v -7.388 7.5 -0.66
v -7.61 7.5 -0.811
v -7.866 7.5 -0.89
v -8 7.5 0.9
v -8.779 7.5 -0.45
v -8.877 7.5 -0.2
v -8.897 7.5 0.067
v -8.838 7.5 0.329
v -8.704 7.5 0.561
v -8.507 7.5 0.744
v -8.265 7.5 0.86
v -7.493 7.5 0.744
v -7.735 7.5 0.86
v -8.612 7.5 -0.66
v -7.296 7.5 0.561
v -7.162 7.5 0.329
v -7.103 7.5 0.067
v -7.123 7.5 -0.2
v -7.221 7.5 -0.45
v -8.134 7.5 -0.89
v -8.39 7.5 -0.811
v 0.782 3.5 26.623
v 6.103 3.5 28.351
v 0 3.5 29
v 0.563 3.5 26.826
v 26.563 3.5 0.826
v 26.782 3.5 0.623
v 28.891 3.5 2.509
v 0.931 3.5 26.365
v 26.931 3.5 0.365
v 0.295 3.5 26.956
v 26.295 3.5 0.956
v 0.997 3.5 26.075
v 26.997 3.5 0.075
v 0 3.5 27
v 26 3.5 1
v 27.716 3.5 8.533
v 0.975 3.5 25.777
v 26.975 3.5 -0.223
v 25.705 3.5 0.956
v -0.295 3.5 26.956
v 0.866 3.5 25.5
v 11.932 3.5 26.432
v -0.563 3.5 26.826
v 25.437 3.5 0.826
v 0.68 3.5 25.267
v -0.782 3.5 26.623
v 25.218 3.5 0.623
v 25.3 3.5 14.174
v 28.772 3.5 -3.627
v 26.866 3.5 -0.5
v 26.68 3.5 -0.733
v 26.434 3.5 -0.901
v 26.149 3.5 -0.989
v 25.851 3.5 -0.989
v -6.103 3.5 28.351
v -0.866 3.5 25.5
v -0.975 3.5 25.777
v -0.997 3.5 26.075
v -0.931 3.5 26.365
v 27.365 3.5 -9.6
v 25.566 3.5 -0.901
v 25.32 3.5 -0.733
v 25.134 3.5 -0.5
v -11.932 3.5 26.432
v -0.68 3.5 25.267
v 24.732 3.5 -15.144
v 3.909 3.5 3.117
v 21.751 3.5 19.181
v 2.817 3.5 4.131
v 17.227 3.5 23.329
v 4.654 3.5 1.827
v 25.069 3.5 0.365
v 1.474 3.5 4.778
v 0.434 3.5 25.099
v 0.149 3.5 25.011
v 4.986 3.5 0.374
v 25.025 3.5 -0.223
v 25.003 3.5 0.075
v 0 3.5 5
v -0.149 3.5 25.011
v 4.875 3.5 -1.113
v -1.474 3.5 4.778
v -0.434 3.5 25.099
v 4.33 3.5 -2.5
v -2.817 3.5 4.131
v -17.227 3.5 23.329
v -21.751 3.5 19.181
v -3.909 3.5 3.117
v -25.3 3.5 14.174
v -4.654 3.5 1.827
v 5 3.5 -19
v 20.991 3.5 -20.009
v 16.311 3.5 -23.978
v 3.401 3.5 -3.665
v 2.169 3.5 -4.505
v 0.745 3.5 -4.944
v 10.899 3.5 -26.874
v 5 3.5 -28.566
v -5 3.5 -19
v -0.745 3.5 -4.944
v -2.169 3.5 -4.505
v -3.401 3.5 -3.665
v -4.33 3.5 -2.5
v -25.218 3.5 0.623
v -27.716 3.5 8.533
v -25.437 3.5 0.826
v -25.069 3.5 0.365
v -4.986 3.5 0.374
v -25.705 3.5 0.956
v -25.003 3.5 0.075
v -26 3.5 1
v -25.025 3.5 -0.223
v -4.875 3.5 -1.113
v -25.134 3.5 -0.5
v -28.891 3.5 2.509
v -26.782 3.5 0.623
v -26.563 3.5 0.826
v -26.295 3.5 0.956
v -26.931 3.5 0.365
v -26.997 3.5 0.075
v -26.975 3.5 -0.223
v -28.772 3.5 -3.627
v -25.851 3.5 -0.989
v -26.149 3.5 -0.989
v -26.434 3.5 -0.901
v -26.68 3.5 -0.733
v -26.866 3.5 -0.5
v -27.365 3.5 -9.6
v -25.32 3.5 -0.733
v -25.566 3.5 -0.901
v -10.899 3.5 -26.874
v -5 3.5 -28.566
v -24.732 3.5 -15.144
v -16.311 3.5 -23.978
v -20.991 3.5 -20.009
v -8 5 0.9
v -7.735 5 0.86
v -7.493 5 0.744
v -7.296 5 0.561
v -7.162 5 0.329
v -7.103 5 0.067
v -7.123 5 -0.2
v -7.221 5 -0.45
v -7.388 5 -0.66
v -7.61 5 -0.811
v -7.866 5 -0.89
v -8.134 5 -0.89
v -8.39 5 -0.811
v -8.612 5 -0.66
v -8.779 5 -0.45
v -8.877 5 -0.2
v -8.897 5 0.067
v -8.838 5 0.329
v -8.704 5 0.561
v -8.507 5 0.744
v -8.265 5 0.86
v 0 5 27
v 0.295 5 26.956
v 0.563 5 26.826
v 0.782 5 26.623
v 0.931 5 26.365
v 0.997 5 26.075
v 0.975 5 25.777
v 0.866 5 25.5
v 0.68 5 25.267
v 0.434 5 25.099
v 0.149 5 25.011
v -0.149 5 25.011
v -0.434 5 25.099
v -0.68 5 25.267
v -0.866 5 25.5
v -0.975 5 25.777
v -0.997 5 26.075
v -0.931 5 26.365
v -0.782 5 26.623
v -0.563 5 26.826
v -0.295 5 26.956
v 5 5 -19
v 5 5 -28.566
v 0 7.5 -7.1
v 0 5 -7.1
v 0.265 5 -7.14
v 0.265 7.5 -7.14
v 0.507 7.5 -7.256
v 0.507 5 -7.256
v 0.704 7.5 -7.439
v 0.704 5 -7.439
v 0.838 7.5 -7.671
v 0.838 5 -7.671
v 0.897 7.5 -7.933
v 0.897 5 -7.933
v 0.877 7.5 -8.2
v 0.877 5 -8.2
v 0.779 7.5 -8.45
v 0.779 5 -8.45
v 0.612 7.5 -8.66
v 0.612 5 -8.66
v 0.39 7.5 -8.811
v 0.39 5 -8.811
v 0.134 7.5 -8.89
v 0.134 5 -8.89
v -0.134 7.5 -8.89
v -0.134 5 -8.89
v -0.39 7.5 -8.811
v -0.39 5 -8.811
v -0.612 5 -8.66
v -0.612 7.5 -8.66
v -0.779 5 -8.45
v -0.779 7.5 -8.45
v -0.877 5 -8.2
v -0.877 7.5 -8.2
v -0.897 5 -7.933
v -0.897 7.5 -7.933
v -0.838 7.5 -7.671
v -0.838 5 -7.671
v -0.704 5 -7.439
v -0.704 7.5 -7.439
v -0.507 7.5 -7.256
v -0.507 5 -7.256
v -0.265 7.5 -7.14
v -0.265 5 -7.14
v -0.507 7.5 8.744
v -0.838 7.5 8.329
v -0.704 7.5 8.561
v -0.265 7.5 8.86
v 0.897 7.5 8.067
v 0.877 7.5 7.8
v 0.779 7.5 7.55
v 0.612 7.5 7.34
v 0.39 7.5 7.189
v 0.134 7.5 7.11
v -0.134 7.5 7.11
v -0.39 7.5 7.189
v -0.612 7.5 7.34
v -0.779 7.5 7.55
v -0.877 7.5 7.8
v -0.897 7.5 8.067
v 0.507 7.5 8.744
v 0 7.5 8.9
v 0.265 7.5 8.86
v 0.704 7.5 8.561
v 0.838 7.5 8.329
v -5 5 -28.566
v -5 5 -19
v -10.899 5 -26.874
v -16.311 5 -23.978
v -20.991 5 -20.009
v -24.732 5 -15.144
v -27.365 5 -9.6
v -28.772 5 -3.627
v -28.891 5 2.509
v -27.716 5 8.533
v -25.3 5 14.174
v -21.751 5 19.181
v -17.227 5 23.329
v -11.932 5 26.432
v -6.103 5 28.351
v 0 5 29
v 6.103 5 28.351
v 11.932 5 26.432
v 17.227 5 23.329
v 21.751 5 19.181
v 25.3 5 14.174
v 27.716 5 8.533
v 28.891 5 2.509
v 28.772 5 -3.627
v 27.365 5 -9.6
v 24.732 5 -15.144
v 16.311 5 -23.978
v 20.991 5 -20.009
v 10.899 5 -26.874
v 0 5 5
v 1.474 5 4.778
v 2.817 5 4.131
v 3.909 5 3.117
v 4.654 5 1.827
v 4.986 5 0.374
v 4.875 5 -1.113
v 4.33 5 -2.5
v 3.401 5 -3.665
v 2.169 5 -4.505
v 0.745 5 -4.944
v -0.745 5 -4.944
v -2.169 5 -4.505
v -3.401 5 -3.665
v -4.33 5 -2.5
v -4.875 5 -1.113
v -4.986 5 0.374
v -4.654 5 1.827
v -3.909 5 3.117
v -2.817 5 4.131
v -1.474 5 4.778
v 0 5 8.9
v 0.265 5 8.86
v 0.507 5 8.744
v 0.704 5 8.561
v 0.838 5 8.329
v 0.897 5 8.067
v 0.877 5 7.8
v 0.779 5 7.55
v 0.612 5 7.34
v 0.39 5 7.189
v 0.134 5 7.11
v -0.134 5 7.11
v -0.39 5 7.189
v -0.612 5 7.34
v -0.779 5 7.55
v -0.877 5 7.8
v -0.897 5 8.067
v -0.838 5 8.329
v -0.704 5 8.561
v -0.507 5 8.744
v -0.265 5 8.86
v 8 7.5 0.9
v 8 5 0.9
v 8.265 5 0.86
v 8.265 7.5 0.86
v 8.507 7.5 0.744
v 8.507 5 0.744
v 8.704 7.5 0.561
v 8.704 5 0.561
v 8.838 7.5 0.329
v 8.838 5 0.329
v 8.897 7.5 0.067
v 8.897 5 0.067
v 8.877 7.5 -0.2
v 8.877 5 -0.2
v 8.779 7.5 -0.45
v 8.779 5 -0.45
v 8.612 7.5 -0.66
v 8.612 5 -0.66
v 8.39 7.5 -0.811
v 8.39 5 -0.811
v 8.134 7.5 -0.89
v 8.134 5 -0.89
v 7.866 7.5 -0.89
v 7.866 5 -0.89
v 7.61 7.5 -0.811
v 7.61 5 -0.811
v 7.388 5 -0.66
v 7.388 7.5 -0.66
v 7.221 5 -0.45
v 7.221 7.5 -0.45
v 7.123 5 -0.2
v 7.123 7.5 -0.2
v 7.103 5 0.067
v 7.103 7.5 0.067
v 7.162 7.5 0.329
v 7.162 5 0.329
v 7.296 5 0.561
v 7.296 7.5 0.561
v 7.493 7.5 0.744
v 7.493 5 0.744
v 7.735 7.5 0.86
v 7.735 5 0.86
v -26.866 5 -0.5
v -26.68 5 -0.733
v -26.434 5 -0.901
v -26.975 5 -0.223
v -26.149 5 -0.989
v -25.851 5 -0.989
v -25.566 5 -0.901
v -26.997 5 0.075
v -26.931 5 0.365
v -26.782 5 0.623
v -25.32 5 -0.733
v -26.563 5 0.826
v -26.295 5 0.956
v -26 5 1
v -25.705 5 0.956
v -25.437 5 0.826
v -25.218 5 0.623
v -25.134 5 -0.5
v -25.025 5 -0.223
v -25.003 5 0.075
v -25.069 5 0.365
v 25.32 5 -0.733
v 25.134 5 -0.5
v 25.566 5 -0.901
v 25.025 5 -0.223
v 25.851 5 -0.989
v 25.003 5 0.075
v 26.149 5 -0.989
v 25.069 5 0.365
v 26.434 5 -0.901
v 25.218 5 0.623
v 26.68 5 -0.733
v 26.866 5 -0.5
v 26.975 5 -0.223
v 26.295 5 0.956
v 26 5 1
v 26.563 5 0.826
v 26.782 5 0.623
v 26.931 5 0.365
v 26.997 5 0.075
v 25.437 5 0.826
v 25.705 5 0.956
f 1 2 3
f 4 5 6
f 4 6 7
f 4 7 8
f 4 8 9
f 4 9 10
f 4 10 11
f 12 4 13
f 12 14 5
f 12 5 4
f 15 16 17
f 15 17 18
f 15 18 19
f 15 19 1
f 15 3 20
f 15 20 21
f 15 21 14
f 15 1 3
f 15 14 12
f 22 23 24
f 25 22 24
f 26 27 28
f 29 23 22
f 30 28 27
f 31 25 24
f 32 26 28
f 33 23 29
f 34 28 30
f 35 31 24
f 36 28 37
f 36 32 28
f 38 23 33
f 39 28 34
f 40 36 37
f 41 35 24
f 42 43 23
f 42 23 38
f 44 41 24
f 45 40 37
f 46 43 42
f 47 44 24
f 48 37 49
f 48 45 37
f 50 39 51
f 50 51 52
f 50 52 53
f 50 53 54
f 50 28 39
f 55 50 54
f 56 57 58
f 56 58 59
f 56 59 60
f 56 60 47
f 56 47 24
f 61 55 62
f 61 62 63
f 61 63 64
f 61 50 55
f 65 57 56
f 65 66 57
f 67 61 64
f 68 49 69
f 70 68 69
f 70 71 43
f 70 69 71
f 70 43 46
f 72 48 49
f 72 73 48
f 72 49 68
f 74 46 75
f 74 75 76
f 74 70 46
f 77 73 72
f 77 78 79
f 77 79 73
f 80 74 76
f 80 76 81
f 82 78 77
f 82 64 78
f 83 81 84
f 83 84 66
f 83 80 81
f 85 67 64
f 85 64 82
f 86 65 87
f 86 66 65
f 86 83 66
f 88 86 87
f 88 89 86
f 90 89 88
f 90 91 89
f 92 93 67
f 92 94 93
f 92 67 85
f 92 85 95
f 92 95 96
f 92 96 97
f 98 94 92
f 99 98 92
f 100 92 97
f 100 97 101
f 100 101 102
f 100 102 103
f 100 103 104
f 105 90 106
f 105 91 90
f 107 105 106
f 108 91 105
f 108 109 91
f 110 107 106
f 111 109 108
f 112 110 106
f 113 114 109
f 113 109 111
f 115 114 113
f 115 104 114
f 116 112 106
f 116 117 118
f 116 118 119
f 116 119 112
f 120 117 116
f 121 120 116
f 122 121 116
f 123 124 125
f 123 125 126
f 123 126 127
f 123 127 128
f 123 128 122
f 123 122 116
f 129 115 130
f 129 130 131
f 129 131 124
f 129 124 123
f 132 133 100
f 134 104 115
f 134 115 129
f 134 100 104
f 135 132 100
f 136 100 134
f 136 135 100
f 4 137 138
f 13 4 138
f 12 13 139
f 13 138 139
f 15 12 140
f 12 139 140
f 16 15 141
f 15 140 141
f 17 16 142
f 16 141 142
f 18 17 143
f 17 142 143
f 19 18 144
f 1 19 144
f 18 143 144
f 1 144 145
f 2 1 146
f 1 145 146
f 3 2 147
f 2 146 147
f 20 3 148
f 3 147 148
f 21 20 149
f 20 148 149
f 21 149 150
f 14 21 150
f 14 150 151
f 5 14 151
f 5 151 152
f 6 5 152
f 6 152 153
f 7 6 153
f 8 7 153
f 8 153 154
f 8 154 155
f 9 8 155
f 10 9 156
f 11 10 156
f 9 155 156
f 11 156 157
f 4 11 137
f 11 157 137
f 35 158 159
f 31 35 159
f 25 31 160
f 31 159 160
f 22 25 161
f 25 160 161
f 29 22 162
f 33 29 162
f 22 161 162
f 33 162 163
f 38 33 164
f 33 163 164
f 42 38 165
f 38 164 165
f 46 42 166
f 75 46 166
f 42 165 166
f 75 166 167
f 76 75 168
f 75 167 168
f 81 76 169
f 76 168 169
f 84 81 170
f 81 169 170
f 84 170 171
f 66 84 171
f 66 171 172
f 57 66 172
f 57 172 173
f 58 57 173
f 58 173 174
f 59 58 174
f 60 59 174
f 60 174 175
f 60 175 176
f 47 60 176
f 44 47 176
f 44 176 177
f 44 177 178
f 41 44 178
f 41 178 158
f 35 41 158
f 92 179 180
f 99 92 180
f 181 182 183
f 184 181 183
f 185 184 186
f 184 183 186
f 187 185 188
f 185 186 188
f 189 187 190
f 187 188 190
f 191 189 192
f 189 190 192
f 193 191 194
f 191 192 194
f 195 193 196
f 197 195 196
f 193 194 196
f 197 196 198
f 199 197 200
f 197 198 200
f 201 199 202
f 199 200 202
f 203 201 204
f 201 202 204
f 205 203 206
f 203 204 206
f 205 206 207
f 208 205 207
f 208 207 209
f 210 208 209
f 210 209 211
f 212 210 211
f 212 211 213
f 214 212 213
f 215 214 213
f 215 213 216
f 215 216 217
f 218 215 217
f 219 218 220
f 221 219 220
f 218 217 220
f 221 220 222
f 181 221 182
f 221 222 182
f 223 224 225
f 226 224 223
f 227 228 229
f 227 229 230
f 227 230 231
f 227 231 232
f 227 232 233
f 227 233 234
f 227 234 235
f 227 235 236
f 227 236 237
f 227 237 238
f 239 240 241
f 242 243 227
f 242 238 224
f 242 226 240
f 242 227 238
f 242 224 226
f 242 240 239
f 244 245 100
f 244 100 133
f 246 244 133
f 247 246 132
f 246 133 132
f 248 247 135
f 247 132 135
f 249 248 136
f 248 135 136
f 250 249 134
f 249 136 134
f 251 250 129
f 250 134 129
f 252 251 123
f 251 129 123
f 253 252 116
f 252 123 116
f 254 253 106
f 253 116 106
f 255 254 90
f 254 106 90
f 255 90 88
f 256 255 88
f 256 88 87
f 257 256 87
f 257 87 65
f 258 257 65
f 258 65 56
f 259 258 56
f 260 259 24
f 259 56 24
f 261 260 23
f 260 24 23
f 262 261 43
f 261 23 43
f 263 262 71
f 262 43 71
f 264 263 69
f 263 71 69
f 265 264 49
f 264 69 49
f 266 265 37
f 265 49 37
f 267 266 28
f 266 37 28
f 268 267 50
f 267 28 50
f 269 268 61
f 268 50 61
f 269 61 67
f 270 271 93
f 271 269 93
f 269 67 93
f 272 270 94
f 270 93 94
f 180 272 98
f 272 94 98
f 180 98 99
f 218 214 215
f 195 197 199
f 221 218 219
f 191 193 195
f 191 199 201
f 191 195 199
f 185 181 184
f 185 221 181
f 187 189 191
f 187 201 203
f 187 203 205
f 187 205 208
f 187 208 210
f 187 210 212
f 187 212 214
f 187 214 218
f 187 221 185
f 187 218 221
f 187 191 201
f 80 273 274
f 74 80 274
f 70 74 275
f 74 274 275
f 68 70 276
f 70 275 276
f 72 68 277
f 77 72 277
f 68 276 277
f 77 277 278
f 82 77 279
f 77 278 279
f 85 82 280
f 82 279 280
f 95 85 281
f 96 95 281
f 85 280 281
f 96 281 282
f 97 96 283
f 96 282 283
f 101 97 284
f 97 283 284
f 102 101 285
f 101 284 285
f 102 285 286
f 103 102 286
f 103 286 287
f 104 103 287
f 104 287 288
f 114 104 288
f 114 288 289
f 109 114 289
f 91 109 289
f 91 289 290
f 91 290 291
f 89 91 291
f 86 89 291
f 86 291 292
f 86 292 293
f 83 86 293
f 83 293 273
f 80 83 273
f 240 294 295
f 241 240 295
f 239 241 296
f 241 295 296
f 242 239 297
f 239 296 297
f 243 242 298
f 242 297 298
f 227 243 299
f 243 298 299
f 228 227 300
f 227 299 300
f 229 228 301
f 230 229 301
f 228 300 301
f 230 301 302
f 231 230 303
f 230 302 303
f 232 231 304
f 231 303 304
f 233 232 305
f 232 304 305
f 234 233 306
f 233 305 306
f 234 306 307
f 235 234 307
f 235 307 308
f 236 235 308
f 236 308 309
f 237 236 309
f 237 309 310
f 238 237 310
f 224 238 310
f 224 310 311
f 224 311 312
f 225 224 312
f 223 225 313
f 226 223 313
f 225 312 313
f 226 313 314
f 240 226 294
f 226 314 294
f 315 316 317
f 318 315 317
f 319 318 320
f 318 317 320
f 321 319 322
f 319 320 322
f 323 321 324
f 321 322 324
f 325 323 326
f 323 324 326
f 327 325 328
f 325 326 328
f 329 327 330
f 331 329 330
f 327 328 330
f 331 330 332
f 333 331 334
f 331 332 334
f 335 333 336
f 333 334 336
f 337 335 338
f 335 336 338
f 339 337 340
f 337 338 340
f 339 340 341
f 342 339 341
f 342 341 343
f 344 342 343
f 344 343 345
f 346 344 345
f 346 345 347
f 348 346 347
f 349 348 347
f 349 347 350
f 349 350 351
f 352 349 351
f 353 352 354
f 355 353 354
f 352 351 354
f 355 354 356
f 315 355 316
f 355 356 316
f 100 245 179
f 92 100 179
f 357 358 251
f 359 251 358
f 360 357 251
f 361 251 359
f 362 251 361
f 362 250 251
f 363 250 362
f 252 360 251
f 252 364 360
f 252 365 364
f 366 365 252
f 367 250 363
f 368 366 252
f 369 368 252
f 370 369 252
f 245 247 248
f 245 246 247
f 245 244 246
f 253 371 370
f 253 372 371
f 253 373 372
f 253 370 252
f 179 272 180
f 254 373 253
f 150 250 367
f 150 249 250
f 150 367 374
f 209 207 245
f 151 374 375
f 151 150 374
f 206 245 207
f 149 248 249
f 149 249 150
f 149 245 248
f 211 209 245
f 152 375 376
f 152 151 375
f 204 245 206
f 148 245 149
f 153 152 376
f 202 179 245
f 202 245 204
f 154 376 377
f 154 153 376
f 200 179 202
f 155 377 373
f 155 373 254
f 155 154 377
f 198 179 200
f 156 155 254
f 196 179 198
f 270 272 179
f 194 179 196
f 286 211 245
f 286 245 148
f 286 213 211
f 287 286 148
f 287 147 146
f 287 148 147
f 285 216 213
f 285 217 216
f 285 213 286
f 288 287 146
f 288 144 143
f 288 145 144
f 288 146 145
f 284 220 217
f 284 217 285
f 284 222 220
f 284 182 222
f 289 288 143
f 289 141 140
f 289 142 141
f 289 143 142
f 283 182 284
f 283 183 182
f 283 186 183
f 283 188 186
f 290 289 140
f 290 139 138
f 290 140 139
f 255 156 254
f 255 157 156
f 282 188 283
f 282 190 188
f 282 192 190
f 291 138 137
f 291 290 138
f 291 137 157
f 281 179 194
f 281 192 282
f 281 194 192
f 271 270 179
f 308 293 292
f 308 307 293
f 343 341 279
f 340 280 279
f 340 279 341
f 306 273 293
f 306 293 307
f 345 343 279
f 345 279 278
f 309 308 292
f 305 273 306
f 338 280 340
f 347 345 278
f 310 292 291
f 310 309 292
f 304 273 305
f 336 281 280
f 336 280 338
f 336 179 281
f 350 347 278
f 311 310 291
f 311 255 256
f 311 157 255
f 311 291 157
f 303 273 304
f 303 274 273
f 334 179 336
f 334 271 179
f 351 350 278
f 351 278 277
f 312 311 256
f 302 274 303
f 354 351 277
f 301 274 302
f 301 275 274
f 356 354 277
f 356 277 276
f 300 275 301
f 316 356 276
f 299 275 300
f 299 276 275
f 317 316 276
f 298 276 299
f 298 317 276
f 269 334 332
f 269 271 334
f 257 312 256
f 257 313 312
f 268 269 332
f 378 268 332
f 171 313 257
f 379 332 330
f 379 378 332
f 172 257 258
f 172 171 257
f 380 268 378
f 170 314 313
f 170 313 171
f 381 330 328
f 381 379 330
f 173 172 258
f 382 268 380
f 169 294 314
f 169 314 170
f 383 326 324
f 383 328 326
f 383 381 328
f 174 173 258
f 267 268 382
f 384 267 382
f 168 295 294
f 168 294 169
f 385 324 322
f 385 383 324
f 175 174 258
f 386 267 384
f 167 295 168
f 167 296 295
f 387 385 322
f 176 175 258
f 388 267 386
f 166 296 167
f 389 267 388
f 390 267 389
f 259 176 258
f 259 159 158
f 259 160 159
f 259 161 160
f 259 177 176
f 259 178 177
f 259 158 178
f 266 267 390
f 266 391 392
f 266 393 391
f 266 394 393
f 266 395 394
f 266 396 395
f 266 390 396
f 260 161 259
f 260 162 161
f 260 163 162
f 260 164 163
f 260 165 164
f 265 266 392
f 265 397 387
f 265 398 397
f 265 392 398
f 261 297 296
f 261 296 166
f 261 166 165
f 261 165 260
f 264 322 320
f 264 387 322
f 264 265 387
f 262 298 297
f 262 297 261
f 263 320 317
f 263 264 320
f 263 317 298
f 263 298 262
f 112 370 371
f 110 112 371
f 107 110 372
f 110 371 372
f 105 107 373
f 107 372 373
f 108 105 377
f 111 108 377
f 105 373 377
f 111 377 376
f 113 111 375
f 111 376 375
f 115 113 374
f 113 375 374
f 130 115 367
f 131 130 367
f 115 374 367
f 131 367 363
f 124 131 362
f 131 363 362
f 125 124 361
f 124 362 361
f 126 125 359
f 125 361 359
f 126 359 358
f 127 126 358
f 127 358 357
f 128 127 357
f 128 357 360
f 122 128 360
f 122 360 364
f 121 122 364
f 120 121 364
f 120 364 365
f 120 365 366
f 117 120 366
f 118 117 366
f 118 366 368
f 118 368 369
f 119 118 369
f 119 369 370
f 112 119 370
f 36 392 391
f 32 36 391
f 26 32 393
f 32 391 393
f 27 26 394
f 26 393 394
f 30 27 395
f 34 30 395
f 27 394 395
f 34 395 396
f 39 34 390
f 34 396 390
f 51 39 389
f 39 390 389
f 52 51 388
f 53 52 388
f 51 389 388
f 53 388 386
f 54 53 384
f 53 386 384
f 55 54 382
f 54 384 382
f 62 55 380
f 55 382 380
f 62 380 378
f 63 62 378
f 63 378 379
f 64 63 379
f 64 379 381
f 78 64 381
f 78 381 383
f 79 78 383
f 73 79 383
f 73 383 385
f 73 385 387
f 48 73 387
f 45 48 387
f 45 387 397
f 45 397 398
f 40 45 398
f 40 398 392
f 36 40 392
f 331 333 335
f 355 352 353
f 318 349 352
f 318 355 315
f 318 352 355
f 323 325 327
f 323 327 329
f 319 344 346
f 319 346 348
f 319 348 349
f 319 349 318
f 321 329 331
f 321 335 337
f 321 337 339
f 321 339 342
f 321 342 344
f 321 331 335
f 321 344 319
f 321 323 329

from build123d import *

# Parameters (mm, degrees)
SKETCH1_R           = 29
BOSS_EXTRUDE1_DEPTH = 5
SKETCH4_R           = 0.9
BOSS_EXTRUDE2_DEPTH = 2.5
SKETCH7_R           = 5
CUT_EXTRUDE4_DEPTH  = 5
SKETCH11_R          = 1
CUT_EXTRUDE6_DEPTH  = 5
SKETCH12_R          = 29
CUT_EXTRUDE7_DEPTH  = 1
SKETCH13_W          = 10
SKETCH13_H          = 10
CUT_EXTRUDE8_DEPTH  = 10
SKETCH14_R          = 29
CUT_EXTRUDE9_DEPTH  = 2.5


with BuildPart() as part:
    # Sketch1 → Boss-Extrude1 (new body)
    with BuildSketch(Plane(origin=(0, 0, 0), x_dir=(1, 0, 0), z_dir=(0, 1, 0))):
        with Locations(Location((0, 0, 0), (0, 0, 270))):
            Circle(SKETCH1_R)
    extrude(amount=BOSS_EXTRUDE1_DEPTH)

    # Sketch4 → Boss-Extrude2 (add)
    with BuildSketch(Plane(origin=(0, 5, 0), x_dir=(1, 0, 0), z_dir=(0, 1, 0))):
        with Locations(Location((8, 0, 0), (0, 0, 270))):
            Circle(SKETCH4_R)
        with Locations(Location((-8, 0, 0), (0, 0, 270))):
            Circle(SKETCH4_R)
        with Locations(Location((0, 8, 0), (0, 0, 270))):
            Circle(SKETCH4_R)
        with Locations(Location((0, -8, 0), (0, 0, 270))):
            Circle(SKETCH4_R)
    extrude(amount=BOSS_EXTRUDE2_DEPTH)

    # Sketch7 → Cut-Extrude4 (cut)
    with BuildSketch(Plane(origin=(0, 5, 0), x_dir=(1, 0, 0), z_dir=(0, 1, 0))):
        with Locations(Location((0, 0, 0), (0, 0, 270))):
            Circle(SKETCH7_R)
    extrude(amount=-CUT_EXTRUDE4_DEPTH, mode=Mode.SUBTRACT)

    # Sketch11 → Cut-Extrude6 (cut)
    with BuildSketch(Plane(origin=(0, 5, 0), x_dir=(1, 0, 0), z_dir=(0, 1, 0))):
        with Locations(Location((-26, 0, 0), (0, 0, 270))):
            Circle(SKETCH11_R)
        with Locations(Location((0, -26, 0), (0, 0, 270))):
            Circle(SKETCH11_R)
        with Locations(Location((26, 0, 0), (0, 0, 270))):
            Circle(SKETCH11_R)
    extrude(amount=-CUT_EXTRUDE6_DEPTH, mode=Mode.SUBTRACT)

    # Sketch12 → Cut-Extrude7 (cut)
    with BuildSketch(Plane(origin=(0, 0, 0), x_dir=(-1, 0, 0), z_dir=(0, -1, 0))):
        with Locations(Location((0, 0, 0), (0, 0, 90))):
            Circle(SKETCH12_R)
    extrude(amount=-CUT_EXTRUDE7_DEPTH, mode=Mode.SUBTRACT)

    # Sketch13 → Cut-Extrude8 (cut)
    with BuildSketch(Plane(origin=(0, 5, 0), x_dir=(1, 0, 0), z_dir=(0, 1, 0))):
        with Locations((0, 24)):
            Rectangle(SKETCH13_W, SKETCH13_H)
    extrude(amount=-CUT_EXTRUDE8_DEPTH, mode=Mode.SUBTRACT)

    # Sketch14 → Cut-Extrude9 (cut)
    with BuildSketch(Plane(origin=(0, 1, 0), x_dir=(-1, 0, 0), z_dir=(0, -1, 0))):
        Circle(SKETCH14_R)
    extrude(amount=-CUT_EXTRUDE9_DEPTH, mode=Mode.SUBTRACT)


solid = part.part
